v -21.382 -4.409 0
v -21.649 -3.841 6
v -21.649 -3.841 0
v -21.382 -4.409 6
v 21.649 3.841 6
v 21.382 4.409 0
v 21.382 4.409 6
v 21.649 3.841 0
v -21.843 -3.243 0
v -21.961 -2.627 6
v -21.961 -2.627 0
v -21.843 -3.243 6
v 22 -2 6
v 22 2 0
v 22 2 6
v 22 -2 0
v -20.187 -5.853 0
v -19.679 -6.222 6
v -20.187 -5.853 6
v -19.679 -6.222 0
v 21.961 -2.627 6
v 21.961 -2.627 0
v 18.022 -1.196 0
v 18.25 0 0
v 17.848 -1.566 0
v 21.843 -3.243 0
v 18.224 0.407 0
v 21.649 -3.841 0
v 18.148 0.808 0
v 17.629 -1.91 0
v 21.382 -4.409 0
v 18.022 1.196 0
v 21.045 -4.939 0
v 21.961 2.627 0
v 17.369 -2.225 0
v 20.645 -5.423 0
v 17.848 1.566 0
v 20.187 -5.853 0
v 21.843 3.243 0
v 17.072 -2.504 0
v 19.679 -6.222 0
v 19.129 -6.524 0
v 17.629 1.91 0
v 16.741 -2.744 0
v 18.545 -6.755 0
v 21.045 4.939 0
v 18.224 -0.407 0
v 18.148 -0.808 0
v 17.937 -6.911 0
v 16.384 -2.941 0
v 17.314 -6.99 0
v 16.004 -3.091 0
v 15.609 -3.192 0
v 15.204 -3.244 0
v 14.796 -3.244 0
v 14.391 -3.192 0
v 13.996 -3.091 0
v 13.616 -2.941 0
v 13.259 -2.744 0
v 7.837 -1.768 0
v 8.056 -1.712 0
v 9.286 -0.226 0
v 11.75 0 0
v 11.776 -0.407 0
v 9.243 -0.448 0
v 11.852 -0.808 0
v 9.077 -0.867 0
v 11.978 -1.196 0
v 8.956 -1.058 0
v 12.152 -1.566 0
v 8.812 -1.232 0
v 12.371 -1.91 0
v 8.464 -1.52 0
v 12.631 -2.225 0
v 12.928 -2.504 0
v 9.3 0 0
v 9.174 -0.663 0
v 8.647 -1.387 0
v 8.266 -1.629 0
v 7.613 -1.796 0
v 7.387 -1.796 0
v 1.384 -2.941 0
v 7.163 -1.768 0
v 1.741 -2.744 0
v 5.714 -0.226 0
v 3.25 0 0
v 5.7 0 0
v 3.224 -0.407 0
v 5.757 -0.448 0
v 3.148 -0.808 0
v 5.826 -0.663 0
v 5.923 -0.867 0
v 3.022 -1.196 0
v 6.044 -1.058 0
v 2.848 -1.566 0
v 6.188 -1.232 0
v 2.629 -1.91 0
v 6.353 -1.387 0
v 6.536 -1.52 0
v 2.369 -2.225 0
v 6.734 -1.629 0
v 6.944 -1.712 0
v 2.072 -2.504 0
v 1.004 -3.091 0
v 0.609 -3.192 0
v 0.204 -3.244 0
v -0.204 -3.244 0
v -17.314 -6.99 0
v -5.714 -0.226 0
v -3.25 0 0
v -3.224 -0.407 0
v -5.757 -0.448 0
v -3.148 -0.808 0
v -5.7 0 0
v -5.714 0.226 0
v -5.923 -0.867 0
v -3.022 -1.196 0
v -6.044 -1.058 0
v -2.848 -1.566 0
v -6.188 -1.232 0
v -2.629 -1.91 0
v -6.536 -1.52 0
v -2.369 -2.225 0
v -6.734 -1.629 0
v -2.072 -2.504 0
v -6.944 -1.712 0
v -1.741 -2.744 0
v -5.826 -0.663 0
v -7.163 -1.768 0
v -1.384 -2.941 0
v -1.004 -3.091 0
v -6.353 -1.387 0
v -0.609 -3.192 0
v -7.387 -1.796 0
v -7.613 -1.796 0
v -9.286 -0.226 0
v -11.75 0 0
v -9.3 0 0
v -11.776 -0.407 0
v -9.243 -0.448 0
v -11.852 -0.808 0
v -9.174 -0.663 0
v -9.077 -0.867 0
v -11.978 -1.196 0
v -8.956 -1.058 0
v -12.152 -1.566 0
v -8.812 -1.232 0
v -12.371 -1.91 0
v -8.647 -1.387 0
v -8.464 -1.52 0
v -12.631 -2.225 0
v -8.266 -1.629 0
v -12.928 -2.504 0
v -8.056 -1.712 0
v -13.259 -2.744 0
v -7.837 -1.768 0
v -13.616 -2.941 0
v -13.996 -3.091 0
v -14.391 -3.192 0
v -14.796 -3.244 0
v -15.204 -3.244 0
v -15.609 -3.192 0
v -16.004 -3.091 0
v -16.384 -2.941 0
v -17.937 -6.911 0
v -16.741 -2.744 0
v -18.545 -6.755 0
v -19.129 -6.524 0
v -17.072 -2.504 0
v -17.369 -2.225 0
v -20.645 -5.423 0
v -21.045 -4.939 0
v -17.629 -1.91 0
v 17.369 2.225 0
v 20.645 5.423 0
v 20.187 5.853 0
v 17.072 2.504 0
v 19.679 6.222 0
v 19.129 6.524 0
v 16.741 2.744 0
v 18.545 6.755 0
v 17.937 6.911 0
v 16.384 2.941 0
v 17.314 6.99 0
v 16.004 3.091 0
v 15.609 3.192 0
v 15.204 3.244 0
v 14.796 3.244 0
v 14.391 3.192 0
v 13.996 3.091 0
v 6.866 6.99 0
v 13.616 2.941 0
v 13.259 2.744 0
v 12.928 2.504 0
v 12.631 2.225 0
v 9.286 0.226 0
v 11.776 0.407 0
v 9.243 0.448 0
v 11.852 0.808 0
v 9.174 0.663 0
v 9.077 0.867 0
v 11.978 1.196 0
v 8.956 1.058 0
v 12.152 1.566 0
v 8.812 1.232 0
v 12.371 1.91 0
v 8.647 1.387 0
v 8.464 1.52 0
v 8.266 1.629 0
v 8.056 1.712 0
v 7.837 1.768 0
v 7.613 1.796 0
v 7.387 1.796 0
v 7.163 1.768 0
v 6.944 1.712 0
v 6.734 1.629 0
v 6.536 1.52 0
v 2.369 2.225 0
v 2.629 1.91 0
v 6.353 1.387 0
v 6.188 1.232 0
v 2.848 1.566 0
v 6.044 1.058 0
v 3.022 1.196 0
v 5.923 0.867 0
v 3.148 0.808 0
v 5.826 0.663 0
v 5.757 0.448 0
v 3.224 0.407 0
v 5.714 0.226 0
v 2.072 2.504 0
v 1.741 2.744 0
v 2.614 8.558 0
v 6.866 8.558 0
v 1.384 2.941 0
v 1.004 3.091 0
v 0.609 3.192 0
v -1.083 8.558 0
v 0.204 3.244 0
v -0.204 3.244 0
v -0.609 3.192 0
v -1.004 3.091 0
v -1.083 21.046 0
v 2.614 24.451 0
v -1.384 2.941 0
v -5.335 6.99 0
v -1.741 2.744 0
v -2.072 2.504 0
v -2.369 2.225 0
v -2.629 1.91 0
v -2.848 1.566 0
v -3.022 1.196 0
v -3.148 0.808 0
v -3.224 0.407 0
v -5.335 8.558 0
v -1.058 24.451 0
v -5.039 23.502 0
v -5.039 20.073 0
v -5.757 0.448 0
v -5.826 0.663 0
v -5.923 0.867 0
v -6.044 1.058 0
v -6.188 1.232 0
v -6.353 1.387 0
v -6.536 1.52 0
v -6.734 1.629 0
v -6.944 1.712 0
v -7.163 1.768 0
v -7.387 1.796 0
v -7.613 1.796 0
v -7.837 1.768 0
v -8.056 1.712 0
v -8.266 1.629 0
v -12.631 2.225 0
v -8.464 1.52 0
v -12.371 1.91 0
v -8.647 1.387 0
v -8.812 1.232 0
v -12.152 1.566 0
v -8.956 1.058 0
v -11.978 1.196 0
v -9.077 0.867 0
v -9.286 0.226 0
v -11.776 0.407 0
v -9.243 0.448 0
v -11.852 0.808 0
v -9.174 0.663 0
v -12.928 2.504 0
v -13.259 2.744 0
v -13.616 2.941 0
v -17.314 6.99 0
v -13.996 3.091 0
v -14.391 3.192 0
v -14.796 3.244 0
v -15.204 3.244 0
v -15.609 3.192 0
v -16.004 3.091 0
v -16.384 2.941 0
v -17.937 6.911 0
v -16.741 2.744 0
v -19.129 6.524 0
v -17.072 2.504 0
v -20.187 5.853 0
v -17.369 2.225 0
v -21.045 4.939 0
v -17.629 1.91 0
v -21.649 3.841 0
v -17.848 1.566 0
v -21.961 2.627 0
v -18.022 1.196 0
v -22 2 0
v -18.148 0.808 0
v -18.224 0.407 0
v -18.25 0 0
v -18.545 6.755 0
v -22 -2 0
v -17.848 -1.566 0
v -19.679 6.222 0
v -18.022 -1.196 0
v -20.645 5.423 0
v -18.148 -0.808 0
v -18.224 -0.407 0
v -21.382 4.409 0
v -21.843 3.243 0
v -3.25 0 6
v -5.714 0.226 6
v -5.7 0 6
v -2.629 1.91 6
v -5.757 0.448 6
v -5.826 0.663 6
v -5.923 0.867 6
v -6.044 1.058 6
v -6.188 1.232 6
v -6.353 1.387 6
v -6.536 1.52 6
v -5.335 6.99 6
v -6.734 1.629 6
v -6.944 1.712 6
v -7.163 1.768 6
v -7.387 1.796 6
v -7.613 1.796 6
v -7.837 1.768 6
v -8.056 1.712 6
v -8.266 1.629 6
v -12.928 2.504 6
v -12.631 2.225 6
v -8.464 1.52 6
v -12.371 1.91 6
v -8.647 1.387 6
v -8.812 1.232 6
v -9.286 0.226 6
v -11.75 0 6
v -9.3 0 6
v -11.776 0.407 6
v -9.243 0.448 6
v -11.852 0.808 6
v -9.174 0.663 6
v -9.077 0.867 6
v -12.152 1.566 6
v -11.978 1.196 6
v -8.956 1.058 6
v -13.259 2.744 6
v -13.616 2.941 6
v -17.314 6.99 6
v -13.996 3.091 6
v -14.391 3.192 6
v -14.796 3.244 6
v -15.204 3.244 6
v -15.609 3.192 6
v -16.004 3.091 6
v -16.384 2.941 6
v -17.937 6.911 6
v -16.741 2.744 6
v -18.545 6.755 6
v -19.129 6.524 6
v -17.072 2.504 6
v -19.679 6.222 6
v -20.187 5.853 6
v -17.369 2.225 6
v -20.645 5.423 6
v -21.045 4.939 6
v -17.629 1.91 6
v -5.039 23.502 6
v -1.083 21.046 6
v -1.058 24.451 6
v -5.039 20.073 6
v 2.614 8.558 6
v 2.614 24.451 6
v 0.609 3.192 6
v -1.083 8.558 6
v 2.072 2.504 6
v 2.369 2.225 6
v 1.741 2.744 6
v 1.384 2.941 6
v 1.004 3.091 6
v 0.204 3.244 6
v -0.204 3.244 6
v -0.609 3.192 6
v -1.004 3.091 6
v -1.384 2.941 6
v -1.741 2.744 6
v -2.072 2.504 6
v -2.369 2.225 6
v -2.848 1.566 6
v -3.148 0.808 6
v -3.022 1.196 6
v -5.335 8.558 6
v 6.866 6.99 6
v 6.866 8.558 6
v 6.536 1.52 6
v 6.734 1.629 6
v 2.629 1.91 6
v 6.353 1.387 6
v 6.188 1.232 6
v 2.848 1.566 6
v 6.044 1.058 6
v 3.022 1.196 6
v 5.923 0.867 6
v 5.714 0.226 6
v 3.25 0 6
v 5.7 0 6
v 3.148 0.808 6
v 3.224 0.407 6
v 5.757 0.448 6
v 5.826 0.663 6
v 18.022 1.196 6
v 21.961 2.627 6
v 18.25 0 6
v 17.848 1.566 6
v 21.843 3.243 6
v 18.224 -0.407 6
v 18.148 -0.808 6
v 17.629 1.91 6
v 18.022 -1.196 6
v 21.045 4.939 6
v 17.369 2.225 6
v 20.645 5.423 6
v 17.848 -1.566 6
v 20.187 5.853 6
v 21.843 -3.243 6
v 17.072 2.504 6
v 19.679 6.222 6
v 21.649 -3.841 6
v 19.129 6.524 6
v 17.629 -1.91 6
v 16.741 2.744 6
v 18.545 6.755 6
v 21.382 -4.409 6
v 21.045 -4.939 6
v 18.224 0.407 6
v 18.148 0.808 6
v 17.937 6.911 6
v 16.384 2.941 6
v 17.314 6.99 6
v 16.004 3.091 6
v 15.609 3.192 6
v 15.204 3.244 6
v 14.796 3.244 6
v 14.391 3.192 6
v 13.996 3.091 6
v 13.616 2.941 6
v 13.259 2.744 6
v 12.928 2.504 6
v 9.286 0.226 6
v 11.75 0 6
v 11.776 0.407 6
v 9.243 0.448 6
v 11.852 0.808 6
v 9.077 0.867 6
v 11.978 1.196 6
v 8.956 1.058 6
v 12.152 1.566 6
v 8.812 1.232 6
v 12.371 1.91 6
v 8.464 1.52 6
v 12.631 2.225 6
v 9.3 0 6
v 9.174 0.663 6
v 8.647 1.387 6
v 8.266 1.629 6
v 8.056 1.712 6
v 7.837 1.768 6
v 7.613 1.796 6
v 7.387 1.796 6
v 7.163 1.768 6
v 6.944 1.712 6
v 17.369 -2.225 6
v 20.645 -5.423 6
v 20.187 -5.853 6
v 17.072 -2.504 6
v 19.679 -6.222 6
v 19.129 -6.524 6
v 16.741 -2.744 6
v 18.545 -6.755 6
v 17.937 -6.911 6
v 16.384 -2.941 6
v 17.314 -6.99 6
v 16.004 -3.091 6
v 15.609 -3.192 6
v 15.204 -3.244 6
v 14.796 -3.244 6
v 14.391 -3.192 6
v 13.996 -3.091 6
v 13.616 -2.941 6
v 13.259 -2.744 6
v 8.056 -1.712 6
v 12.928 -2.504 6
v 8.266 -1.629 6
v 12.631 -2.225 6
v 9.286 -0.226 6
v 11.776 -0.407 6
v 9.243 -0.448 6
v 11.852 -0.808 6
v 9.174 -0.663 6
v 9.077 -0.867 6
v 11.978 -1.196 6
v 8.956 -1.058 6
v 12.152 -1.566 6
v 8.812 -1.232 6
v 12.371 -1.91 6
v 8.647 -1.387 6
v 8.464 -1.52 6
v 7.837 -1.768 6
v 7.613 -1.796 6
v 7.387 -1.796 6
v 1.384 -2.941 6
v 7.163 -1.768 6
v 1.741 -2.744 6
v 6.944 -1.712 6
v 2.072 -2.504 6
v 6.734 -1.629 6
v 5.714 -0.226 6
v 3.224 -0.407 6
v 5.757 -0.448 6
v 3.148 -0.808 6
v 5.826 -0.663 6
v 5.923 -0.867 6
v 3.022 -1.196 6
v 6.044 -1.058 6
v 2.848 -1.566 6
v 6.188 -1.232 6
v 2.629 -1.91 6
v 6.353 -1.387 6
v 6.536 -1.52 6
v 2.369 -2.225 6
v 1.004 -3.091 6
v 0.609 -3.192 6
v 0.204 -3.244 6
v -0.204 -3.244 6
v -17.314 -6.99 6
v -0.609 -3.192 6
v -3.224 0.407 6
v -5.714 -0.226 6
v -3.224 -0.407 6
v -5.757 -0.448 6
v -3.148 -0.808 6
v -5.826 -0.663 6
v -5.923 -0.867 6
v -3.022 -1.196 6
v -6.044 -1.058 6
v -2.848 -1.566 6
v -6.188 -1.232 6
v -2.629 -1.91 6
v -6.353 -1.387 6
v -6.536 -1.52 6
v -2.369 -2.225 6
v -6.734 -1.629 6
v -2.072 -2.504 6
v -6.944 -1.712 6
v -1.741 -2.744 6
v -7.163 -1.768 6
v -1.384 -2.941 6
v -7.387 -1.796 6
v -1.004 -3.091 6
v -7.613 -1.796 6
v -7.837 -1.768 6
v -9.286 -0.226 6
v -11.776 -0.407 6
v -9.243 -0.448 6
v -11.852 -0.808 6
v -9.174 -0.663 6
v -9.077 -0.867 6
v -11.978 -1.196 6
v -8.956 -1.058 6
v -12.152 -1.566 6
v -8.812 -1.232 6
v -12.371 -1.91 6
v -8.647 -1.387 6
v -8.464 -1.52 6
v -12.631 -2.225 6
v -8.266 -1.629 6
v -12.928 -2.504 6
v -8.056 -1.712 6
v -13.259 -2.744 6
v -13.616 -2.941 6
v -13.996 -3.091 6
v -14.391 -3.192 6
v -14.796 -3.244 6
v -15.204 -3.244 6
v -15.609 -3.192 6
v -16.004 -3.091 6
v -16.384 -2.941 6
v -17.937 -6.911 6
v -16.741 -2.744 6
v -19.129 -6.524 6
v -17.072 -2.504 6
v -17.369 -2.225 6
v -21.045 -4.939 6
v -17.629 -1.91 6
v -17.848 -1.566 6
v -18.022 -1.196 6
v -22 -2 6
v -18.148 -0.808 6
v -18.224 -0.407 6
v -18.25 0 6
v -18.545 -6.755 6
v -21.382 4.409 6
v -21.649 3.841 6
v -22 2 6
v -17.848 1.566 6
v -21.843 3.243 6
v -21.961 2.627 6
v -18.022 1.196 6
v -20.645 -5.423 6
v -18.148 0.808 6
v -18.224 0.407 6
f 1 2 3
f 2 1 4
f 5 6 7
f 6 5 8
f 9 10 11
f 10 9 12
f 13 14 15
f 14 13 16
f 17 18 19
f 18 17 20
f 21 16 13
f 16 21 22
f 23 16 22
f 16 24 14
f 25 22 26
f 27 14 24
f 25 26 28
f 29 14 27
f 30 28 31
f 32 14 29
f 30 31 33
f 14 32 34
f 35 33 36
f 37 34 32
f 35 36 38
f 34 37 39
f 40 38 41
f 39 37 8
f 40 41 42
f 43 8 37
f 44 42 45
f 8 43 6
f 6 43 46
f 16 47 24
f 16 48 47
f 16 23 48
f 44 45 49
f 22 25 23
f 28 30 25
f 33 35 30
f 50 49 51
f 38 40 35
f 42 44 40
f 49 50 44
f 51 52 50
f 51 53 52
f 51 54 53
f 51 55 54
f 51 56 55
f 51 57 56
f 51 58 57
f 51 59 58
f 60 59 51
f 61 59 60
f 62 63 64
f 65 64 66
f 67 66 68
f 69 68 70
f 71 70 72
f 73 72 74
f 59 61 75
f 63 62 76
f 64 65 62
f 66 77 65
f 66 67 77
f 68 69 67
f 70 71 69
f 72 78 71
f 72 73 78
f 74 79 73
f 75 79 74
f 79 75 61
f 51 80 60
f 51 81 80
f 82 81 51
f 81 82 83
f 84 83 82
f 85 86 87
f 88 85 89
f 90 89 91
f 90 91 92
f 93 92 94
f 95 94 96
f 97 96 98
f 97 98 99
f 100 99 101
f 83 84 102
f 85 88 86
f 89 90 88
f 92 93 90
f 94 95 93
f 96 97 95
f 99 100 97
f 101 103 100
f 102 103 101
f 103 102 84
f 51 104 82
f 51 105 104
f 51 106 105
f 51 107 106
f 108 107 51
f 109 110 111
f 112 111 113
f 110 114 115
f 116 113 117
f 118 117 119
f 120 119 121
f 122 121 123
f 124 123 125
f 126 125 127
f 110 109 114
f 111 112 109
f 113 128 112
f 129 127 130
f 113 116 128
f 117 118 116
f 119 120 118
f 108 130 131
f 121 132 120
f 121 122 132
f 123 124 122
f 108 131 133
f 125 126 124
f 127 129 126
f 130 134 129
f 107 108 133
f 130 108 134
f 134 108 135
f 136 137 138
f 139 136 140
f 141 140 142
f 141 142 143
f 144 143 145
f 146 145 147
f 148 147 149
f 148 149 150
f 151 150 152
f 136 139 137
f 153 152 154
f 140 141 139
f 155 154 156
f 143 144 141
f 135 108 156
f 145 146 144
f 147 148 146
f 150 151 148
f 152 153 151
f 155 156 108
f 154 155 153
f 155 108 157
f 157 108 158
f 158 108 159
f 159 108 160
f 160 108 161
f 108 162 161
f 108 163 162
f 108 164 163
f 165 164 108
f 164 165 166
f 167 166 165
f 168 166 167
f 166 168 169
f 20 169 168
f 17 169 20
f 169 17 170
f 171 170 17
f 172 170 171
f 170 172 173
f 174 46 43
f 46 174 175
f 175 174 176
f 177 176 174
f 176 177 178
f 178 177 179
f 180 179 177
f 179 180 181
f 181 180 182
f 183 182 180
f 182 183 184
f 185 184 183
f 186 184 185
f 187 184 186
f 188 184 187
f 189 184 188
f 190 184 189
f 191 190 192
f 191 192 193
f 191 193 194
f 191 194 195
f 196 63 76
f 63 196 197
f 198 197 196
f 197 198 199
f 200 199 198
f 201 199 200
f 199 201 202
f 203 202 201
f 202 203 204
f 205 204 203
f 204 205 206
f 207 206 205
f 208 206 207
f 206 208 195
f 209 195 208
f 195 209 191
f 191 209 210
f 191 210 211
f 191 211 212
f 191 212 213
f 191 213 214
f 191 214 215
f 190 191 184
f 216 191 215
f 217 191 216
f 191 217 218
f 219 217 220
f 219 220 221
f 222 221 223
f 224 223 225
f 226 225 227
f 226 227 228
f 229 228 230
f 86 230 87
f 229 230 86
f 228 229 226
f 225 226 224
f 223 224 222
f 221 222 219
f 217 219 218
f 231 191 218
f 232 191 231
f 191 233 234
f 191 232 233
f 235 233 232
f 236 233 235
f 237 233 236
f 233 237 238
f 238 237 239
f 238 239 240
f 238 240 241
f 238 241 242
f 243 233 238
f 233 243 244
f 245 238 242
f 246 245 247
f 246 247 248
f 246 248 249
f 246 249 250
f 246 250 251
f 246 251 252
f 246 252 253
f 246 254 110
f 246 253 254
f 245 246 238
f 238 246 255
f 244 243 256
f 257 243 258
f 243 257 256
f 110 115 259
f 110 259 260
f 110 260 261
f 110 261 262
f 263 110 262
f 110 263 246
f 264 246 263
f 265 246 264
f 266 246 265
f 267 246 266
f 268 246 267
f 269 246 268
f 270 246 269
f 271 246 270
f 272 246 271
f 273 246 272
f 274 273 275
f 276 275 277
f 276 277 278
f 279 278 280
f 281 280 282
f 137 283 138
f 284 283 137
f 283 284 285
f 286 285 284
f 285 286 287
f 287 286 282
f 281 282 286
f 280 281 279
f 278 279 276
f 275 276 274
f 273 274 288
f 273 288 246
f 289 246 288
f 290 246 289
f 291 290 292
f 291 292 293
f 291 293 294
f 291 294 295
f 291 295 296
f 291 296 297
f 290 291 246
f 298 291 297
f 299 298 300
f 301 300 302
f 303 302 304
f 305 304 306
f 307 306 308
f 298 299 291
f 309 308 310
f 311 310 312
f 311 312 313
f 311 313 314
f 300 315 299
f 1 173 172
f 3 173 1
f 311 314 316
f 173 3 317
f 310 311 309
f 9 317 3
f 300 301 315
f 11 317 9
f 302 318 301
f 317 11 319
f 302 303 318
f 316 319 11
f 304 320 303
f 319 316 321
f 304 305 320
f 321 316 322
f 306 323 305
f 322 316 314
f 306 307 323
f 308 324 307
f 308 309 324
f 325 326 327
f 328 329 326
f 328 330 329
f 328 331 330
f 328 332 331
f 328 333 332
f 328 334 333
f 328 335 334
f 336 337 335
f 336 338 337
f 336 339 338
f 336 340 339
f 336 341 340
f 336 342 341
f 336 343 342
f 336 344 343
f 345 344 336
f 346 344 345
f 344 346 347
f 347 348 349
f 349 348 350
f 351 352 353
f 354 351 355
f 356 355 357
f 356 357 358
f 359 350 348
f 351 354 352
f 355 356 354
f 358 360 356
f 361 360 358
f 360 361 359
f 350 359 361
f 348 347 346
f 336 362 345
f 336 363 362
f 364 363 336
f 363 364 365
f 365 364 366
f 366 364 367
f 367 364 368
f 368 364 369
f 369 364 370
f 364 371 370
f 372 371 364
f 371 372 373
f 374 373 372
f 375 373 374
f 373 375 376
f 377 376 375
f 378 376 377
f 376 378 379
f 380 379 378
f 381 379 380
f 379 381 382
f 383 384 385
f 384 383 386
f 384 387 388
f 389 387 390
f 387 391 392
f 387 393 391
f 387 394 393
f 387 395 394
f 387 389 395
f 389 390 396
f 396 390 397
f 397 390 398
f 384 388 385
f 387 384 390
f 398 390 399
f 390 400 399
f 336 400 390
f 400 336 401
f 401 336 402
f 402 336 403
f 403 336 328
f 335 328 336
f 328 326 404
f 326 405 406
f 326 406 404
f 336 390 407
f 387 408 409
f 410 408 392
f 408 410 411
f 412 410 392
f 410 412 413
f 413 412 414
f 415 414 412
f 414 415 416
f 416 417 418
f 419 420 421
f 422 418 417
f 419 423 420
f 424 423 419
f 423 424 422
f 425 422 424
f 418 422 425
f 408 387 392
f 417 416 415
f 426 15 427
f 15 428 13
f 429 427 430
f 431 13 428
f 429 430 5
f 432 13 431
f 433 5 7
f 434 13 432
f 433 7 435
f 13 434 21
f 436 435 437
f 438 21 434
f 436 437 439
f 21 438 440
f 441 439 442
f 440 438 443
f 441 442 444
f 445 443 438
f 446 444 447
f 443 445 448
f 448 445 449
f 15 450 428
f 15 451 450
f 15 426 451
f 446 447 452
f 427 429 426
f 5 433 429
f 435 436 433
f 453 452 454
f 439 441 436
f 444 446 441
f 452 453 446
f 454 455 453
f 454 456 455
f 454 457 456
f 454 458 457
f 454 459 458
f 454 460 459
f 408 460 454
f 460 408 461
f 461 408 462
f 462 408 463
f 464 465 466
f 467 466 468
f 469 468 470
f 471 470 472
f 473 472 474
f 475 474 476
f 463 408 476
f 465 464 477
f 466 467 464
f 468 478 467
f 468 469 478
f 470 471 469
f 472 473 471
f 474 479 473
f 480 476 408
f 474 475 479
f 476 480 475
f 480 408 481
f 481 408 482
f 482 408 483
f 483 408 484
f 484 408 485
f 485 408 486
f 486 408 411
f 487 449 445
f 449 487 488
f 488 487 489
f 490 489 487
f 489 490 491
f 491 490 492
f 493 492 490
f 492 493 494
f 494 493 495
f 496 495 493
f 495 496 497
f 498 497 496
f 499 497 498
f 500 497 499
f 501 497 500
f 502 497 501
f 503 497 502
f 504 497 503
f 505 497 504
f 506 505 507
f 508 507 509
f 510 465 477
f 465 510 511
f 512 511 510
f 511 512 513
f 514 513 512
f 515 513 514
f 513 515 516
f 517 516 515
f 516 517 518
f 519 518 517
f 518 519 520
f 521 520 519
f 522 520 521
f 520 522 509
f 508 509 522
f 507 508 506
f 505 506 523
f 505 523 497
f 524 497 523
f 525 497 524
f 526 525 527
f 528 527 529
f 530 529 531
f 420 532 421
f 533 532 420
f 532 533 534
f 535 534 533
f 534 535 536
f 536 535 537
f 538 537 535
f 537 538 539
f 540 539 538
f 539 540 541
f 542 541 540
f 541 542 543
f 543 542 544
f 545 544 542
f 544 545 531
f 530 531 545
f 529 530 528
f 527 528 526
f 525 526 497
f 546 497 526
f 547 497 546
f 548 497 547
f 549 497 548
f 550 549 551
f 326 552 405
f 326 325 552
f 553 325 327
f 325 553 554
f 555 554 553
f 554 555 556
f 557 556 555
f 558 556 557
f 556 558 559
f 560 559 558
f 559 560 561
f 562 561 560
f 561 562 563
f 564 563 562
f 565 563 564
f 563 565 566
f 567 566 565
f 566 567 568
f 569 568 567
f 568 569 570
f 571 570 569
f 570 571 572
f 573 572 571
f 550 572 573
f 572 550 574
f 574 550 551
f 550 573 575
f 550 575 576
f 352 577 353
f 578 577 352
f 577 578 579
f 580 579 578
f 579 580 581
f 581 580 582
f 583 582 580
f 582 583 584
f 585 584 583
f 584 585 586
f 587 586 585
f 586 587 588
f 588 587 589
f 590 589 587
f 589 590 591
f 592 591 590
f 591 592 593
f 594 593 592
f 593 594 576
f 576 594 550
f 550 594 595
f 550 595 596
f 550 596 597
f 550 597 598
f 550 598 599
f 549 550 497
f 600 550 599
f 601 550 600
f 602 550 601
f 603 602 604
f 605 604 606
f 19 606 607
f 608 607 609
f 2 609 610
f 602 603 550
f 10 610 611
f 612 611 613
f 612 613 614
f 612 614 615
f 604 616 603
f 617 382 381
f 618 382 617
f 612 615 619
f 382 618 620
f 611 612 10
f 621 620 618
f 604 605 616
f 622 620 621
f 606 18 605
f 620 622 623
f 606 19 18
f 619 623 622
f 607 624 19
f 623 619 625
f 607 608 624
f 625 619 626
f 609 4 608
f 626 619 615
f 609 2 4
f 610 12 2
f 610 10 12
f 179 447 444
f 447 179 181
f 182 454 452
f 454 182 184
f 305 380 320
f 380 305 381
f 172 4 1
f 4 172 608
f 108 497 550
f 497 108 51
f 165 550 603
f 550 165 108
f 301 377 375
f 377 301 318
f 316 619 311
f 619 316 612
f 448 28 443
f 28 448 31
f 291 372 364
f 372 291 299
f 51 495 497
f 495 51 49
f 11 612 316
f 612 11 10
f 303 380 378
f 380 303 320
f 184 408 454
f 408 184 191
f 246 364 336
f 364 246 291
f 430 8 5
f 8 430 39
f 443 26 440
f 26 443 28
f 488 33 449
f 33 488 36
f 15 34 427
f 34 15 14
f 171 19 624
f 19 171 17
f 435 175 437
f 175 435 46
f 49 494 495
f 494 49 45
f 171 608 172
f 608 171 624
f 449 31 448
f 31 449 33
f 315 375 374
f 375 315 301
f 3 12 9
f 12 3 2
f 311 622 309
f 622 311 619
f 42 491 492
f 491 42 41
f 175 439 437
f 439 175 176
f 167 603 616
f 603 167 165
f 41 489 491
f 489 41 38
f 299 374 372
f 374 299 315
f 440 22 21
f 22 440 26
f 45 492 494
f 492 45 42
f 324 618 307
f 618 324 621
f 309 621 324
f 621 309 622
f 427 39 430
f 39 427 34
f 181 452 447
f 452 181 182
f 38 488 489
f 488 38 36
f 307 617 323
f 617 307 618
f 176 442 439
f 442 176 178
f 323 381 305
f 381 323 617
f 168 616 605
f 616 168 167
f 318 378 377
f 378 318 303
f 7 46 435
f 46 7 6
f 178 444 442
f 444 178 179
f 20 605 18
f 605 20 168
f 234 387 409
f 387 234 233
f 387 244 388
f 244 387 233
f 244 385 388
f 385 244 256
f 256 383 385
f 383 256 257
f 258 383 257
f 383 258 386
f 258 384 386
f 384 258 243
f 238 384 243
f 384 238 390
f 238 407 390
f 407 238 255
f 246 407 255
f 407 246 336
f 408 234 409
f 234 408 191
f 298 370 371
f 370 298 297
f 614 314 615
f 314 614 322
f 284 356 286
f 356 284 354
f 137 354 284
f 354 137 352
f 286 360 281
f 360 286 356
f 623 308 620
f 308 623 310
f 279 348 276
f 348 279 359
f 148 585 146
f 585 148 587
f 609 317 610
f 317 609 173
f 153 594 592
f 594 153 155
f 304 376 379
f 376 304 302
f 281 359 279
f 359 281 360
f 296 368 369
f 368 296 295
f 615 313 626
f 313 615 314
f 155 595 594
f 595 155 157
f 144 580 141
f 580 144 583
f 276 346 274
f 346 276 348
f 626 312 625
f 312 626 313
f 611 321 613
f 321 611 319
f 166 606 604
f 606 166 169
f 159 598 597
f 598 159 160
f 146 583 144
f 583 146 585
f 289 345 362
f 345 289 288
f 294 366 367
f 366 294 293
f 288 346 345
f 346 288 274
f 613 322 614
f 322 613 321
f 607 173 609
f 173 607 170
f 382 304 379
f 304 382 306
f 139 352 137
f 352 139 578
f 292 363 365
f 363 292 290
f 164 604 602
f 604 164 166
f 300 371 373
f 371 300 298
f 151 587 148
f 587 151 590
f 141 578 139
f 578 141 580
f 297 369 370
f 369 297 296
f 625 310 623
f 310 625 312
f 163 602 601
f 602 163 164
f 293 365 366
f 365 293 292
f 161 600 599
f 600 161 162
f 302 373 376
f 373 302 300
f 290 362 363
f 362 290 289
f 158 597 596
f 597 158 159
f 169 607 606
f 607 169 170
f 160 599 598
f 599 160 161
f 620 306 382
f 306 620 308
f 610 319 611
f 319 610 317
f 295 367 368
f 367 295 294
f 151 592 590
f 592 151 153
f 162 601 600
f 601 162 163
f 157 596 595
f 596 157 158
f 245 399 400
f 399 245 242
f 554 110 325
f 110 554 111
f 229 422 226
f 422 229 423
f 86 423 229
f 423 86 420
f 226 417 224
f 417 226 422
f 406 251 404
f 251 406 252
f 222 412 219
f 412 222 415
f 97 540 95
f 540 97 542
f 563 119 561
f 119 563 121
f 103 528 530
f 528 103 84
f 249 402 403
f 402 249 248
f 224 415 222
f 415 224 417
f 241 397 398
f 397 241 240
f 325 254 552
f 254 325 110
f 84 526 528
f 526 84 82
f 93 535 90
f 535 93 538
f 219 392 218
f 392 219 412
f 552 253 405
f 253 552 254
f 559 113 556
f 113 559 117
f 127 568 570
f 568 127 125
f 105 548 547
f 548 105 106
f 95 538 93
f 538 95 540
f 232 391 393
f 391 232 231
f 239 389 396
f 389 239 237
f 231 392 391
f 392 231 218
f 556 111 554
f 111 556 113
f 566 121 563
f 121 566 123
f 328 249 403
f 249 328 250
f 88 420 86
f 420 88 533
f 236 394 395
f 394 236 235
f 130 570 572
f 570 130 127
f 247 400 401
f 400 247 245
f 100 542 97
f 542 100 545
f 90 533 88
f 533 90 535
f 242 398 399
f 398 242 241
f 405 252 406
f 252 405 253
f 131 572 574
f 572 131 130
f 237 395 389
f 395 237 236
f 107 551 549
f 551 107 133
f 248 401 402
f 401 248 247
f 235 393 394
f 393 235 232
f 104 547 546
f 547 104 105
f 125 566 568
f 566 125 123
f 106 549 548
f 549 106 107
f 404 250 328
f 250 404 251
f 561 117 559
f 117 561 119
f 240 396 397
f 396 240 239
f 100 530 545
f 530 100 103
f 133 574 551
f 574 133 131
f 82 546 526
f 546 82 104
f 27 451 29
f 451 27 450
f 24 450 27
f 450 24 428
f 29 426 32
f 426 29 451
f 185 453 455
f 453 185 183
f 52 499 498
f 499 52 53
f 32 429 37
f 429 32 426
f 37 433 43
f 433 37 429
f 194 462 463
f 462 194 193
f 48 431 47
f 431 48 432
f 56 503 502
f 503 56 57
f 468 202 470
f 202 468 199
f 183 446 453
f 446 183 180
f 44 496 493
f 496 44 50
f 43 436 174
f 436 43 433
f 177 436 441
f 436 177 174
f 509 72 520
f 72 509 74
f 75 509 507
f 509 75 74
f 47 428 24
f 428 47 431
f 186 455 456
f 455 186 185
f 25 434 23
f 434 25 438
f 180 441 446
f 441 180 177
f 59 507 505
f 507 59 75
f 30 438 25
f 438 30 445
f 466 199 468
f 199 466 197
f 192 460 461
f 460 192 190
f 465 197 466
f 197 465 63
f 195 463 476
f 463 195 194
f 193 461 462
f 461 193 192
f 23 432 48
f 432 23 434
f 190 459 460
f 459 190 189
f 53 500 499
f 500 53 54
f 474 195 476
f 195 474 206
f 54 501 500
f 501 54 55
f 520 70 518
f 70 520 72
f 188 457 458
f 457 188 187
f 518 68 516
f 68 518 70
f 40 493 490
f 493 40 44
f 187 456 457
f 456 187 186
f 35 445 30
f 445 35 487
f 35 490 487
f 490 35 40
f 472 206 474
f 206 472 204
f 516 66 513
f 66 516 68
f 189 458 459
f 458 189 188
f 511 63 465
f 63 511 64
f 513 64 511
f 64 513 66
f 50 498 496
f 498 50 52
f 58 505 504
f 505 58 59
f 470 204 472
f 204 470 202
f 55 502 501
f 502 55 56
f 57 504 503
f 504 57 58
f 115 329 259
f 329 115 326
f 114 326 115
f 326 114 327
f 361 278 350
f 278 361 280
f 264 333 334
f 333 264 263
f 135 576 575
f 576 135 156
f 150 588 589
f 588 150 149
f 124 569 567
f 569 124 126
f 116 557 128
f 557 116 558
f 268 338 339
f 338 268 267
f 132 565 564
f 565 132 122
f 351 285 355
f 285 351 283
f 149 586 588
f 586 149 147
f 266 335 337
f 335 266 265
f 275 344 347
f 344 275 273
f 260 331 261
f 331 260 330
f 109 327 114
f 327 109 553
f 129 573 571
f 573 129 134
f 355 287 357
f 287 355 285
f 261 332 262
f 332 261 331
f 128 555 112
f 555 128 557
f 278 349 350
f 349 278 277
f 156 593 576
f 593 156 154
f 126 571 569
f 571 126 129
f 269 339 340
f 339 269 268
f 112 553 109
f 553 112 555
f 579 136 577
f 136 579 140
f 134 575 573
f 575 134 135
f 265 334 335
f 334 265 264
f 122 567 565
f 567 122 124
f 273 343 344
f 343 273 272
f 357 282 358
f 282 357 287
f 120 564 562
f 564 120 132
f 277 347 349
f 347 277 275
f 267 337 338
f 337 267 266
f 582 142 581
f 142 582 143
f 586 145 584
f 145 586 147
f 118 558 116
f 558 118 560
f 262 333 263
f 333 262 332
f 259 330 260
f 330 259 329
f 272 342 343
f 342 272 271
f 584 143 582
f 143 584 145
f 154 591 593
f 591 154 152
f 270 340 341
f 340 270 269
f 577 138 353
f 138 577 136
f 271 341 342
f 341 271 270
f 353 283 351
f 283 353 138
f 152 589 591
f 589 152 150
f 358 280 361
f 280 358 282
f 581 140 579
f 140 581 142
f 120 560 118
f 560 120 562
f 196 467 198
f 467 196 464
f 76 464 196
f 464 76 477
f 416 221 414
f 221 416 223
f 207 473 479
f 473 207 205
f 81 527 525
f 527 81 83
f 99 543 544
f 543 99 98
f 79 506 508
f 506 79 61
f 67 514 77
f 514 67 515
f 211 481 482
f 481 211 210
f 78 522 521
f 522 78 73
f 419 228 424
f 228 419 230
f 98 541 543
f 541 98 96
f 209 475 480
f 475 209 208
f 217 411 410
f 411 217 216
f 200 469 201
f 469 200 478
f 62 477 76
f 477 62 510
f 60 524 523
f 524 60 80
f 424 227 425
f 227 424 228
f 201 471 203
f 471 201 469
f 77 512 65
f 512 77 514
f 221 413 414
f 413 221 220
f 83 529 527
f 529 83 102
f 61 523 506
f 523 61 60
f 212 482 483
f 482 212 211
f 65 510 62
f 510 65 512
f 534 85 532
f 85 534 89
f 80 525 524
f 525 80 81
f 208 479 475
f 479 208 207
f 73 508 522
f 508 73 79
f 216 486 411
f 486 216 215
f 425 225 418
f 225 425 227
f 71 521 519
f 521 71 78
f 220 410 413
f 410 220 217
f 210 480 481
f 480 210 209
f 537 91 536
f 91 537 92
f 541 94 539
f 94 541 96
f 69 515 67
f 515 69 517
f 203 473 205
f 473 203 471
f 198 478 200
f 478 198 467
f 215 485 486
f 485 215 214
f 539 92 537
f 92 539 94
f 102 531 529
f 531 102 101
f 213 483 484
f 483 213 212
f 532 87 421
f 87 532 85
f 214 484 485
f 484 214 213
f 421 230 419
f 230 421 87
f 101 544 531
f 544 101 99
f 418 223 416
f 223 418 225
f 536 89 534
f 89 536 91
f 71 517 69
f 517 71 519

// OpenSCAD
$fn = 50;


difference() {
	union() {
		hull() {
			translate(v = [-17.0000000000, 2.0000000000, 0]) {
				cylinder(h = 6, r = 5);
			}
			translate(v = [17.0000000000, 2.0000000000, 0]) {
				cylinder(h = 6, r = 5);
			}
			translate(v = [-17.0000000000, -2.0000000000, 0]) {
				cylinder(h = 6, r = 5);
			}
			translate(v = [17.0000000000, -2.0000000000, 0]) {
				cylinder(h = 6, r = 5);
			}
		}
		translate(v = [0, 24, 0]) {
			linear_extrude(height = 6) {
				text(font = "DejaVu Sans Mono:style=Bold", halign = "center", size = 19.0000000000, text = "1", valign = "top");
			}
		}
	}
	union() {
		translate(v = [-15.0000000000, 0.0000000000, 0]) {
			translate(v = [0, 0, -100]) {
				cylinder(h = 200, r = 3.2500000000);
			}
		}
		translate(v = [0, 0, -100]) {
			cylinder(h = 200, r = 3.2500000000);
		}
		translate(v = [15.0000000000, 0.0000000000, 0]) {
			translate(v = [0, 0, -100]) {
				cylinder(h = 200, r = 3.2500000000);
			}
		}
		translate(v = [-15.0000000000, 0.0000000000, 0]) {
			translate(v = [0, 0, -100]) {
				cylinder(h = 200, r = 1.8000000000);
			}
		}
		translate(v = [-7.5000000000, 0.0000000000, 0]) {
			translate(v = [0, 0, -100]) {
				cylinder(h = 200, r = 1.8000000000);
			}
		}
		translate(v = [0, 0, -100]) {
			cylinder(h = 200, r = 1.8000000000);
		}
		translate(v = [7.5000000000, 0.0000000000, 0]) {
			translate(v = [0, 0, -100]) {
				cylinder(h = 200, r = 1.8000000000);
			}
		}
		translate(v = [15.0000000000, 0.0000000000, 0]) {
			translate(v = [0, 0, -100]) {
				cylinder(h = 200, r = 1.8000000000);
			}
		}
	}
}
